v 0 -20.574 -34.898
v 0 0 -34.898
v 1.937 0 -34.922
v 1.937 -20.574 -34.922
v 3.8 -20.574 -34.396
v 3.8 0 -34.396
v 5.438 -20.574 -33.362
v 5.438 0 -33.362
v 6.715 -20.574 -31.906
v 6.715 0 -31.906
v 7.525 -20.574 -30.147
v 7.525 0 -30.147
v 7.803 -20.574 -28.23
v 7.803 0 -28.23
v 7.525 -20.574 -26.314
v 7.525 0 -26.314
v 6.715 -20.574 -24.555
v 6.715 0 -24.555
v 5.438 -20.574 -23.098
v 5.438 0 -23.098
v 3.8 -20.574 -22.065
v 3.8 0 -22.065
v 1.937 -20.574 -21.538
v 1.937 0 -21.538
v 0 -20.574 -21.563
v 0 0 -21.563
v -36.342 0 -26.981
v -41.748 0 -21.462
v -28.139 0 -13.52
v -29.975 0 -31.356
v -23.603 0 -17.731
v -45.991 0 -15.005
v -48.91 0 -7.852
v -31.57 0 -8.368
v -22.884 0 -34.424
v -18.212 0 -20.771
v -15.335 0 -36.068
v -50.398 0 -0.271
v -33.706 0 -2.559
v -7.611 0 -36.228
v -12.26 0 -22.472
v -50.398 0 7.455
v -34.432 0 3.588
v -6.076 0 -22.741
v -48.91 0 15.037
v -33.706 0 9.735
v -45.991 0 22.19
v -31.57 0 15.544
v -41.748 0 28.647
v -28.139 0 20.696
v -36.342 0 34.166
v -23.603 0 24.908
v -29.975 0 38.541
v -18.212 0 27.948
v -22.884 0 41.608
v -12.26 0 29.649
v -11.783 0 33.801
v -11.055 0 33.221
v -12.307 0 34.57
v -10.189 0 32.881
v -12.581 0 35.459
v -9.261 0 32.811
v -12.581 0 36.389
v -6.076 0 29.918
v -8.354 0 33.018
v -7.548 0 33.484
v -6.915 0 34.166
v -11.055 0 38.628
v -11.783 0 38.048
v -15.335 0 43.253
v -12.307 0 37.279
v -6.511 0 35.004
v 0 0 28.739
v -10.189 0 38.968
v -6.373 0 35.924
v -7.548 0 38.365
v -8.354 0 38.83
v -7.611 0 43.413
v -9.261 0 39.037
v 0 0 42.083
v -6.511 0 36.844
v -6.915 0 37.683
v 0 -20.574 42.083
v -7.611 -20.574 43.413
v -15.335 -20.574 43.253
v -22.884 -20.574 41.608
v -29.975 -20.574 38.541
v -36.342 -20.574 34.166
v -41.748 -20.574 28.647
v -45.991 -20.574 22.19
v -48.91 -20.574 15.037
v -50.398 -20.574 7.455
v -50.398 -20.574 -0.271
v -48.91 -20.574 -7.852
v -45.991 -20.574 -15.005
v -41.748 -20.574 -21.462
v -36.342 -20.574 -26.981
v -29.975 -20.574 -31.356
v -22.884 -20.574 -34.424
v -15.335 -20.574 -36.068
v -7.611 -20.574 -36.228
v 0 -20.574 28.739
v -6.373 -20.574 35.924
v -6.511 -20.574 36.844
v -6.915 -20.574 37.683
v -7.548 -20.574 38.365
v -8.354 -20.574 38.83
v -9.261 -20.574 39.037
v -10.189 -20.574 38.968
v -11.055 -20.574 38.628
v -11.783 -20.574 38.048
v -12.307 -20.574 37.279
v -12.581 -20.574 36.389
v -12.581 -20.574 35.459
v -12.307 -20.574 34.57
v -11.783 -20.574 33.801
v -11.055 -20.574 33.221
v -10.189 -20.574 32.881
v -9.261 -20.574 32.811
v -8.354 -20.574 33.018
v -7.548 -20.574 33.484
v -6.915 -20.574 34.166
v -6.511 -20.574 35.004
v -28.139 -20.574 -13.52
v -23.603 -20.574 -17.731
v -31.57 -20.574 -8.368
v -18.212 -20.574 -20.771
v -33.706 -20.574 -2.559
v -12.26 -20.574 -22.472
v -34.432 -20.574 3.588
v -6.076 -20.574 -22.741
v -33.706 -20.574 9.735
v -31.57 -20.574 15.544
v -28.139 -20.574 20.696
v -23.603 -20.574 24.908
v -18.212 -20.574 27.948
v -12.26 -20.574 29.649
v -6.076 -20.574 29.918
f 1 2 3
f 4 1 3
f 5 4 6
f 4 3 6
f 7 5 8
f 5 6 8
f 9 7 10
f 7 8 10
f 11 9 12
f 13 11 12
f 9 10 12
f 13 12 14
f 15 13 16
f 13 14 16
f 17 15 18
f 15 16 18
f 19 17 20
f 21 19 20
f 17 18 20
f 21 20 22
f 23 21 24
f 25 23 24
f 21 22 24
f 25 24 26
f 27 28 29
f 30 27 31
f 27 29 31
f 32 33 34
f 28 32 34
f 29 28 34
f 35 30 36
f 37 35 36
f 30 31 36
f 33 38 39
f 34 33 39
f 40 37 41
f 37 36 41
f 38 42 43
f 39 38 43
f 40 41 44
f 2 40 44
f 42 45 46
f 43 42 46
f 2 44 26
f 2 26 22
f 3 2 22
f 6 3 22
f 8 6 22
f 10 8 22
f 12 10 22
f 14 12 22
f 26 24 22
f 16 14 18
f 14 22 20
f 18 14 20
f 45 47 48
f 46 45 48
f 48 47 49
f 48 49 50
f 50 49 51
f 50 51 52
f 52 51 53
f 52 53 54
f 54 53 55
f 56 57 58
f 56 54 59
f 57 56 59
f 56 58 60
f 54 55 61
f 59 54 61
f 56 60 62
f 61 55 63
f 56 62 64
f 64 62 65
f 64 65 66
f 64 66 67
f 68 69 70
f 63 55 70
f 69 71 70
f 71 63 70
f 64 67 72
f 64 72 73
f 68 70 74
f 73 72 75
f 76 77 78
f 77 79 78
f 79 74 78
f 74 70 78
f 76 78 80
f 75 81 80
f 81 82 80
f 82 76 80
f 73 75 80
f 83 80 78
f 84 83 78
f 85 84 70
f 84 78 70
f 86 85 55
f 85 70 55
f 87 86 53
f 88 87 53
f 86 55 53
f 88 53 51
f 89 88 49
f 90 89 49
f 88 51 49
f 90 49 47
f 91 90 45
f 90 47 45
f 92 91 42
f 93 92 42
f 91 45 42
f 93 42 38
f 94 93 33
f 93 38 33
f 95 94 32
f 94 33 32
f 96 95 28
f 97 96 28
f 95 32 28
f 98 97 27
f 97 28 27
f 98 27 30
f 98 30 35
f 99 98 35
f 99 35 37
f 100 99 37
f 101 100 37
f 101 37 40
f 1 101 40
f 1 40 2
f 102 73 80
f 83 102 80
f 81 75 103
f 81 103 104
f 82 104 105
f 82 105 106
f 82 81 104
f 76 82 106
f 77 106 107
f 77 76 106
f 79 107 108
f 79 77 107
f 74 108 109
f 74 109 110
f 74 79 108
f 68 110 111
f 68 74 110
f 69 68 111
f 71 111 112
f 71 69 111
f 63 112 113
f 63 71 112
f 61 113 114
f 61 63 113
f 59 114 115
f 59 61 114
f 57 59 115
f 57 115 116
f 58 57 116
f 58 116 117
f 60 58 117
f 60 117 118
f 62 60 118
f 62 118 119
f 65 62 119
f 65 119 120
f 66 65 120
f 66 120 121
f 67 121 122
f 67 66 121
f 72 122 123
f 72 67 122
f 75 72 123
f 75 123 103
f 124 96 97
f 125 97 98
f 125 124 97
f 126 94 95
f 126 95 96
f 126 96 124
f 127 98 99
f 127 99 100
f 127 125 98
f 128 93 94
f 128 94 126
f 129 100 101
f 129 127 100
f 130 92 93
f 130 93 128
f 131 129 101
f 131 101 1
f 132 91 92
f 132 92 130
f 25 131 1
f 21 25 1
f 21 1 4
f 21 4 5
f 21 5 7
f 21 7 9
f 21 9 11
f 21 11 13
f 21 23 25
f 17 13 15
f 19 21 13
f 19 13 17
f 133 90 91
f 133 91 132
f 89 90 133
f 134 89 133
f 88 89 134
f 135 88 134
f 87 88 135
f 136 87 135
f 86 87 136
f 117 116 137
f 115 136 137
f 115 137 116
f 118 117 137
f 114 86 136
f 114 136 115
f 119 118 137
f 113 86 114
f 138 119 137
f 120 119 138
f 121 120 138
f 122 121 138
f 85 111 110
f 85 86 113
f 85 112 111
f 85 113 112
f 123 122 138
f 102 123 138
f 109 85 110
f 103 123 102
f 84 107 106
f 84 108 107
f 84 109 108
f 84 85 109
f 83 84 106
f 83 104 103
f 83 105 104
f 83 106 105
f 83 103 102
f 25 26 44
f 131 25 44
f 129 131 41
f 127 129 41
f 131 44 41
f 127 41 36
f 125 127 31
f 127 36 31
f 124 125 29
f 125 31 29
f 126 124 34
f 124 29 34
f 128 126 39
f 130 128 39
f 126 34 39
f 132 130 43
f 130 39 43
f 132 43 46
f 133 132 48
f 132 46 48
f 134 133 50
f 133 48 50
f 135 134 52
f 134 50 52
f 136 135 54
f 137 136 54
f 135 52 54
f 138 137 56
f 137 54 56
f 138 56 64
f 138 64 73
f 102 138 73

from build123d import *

# Parameters (mm, degrees)
F0_R     = 3.121691
F1_DEPTH = 20.574


with BuildPart() as f1:
    # F0 (on Front) → F1 (new body)
    with BuildSketch(Plane.XZ):
        with BuildLine():
            Line((0, 28.73937), (0, 42.082649))
            ThreePointArc((0, 42.082649), (-50.585156, 3.592419), (0, -34.897812))
            ThreePointArc((0, -34.897812), (7.803079, -28.230312), (0, -21.562812))
            ThreePointArc((0, -21.562812), (-34.431843, 3.588279), (0, 28.73937))
        make_face()
        with Locations((-9.494251, 35.924211)):
            Circle(F0_R, mode=Mode.SUBTRACT)
    extrude(amount=F1_DEPTH)


solid = f1.part
